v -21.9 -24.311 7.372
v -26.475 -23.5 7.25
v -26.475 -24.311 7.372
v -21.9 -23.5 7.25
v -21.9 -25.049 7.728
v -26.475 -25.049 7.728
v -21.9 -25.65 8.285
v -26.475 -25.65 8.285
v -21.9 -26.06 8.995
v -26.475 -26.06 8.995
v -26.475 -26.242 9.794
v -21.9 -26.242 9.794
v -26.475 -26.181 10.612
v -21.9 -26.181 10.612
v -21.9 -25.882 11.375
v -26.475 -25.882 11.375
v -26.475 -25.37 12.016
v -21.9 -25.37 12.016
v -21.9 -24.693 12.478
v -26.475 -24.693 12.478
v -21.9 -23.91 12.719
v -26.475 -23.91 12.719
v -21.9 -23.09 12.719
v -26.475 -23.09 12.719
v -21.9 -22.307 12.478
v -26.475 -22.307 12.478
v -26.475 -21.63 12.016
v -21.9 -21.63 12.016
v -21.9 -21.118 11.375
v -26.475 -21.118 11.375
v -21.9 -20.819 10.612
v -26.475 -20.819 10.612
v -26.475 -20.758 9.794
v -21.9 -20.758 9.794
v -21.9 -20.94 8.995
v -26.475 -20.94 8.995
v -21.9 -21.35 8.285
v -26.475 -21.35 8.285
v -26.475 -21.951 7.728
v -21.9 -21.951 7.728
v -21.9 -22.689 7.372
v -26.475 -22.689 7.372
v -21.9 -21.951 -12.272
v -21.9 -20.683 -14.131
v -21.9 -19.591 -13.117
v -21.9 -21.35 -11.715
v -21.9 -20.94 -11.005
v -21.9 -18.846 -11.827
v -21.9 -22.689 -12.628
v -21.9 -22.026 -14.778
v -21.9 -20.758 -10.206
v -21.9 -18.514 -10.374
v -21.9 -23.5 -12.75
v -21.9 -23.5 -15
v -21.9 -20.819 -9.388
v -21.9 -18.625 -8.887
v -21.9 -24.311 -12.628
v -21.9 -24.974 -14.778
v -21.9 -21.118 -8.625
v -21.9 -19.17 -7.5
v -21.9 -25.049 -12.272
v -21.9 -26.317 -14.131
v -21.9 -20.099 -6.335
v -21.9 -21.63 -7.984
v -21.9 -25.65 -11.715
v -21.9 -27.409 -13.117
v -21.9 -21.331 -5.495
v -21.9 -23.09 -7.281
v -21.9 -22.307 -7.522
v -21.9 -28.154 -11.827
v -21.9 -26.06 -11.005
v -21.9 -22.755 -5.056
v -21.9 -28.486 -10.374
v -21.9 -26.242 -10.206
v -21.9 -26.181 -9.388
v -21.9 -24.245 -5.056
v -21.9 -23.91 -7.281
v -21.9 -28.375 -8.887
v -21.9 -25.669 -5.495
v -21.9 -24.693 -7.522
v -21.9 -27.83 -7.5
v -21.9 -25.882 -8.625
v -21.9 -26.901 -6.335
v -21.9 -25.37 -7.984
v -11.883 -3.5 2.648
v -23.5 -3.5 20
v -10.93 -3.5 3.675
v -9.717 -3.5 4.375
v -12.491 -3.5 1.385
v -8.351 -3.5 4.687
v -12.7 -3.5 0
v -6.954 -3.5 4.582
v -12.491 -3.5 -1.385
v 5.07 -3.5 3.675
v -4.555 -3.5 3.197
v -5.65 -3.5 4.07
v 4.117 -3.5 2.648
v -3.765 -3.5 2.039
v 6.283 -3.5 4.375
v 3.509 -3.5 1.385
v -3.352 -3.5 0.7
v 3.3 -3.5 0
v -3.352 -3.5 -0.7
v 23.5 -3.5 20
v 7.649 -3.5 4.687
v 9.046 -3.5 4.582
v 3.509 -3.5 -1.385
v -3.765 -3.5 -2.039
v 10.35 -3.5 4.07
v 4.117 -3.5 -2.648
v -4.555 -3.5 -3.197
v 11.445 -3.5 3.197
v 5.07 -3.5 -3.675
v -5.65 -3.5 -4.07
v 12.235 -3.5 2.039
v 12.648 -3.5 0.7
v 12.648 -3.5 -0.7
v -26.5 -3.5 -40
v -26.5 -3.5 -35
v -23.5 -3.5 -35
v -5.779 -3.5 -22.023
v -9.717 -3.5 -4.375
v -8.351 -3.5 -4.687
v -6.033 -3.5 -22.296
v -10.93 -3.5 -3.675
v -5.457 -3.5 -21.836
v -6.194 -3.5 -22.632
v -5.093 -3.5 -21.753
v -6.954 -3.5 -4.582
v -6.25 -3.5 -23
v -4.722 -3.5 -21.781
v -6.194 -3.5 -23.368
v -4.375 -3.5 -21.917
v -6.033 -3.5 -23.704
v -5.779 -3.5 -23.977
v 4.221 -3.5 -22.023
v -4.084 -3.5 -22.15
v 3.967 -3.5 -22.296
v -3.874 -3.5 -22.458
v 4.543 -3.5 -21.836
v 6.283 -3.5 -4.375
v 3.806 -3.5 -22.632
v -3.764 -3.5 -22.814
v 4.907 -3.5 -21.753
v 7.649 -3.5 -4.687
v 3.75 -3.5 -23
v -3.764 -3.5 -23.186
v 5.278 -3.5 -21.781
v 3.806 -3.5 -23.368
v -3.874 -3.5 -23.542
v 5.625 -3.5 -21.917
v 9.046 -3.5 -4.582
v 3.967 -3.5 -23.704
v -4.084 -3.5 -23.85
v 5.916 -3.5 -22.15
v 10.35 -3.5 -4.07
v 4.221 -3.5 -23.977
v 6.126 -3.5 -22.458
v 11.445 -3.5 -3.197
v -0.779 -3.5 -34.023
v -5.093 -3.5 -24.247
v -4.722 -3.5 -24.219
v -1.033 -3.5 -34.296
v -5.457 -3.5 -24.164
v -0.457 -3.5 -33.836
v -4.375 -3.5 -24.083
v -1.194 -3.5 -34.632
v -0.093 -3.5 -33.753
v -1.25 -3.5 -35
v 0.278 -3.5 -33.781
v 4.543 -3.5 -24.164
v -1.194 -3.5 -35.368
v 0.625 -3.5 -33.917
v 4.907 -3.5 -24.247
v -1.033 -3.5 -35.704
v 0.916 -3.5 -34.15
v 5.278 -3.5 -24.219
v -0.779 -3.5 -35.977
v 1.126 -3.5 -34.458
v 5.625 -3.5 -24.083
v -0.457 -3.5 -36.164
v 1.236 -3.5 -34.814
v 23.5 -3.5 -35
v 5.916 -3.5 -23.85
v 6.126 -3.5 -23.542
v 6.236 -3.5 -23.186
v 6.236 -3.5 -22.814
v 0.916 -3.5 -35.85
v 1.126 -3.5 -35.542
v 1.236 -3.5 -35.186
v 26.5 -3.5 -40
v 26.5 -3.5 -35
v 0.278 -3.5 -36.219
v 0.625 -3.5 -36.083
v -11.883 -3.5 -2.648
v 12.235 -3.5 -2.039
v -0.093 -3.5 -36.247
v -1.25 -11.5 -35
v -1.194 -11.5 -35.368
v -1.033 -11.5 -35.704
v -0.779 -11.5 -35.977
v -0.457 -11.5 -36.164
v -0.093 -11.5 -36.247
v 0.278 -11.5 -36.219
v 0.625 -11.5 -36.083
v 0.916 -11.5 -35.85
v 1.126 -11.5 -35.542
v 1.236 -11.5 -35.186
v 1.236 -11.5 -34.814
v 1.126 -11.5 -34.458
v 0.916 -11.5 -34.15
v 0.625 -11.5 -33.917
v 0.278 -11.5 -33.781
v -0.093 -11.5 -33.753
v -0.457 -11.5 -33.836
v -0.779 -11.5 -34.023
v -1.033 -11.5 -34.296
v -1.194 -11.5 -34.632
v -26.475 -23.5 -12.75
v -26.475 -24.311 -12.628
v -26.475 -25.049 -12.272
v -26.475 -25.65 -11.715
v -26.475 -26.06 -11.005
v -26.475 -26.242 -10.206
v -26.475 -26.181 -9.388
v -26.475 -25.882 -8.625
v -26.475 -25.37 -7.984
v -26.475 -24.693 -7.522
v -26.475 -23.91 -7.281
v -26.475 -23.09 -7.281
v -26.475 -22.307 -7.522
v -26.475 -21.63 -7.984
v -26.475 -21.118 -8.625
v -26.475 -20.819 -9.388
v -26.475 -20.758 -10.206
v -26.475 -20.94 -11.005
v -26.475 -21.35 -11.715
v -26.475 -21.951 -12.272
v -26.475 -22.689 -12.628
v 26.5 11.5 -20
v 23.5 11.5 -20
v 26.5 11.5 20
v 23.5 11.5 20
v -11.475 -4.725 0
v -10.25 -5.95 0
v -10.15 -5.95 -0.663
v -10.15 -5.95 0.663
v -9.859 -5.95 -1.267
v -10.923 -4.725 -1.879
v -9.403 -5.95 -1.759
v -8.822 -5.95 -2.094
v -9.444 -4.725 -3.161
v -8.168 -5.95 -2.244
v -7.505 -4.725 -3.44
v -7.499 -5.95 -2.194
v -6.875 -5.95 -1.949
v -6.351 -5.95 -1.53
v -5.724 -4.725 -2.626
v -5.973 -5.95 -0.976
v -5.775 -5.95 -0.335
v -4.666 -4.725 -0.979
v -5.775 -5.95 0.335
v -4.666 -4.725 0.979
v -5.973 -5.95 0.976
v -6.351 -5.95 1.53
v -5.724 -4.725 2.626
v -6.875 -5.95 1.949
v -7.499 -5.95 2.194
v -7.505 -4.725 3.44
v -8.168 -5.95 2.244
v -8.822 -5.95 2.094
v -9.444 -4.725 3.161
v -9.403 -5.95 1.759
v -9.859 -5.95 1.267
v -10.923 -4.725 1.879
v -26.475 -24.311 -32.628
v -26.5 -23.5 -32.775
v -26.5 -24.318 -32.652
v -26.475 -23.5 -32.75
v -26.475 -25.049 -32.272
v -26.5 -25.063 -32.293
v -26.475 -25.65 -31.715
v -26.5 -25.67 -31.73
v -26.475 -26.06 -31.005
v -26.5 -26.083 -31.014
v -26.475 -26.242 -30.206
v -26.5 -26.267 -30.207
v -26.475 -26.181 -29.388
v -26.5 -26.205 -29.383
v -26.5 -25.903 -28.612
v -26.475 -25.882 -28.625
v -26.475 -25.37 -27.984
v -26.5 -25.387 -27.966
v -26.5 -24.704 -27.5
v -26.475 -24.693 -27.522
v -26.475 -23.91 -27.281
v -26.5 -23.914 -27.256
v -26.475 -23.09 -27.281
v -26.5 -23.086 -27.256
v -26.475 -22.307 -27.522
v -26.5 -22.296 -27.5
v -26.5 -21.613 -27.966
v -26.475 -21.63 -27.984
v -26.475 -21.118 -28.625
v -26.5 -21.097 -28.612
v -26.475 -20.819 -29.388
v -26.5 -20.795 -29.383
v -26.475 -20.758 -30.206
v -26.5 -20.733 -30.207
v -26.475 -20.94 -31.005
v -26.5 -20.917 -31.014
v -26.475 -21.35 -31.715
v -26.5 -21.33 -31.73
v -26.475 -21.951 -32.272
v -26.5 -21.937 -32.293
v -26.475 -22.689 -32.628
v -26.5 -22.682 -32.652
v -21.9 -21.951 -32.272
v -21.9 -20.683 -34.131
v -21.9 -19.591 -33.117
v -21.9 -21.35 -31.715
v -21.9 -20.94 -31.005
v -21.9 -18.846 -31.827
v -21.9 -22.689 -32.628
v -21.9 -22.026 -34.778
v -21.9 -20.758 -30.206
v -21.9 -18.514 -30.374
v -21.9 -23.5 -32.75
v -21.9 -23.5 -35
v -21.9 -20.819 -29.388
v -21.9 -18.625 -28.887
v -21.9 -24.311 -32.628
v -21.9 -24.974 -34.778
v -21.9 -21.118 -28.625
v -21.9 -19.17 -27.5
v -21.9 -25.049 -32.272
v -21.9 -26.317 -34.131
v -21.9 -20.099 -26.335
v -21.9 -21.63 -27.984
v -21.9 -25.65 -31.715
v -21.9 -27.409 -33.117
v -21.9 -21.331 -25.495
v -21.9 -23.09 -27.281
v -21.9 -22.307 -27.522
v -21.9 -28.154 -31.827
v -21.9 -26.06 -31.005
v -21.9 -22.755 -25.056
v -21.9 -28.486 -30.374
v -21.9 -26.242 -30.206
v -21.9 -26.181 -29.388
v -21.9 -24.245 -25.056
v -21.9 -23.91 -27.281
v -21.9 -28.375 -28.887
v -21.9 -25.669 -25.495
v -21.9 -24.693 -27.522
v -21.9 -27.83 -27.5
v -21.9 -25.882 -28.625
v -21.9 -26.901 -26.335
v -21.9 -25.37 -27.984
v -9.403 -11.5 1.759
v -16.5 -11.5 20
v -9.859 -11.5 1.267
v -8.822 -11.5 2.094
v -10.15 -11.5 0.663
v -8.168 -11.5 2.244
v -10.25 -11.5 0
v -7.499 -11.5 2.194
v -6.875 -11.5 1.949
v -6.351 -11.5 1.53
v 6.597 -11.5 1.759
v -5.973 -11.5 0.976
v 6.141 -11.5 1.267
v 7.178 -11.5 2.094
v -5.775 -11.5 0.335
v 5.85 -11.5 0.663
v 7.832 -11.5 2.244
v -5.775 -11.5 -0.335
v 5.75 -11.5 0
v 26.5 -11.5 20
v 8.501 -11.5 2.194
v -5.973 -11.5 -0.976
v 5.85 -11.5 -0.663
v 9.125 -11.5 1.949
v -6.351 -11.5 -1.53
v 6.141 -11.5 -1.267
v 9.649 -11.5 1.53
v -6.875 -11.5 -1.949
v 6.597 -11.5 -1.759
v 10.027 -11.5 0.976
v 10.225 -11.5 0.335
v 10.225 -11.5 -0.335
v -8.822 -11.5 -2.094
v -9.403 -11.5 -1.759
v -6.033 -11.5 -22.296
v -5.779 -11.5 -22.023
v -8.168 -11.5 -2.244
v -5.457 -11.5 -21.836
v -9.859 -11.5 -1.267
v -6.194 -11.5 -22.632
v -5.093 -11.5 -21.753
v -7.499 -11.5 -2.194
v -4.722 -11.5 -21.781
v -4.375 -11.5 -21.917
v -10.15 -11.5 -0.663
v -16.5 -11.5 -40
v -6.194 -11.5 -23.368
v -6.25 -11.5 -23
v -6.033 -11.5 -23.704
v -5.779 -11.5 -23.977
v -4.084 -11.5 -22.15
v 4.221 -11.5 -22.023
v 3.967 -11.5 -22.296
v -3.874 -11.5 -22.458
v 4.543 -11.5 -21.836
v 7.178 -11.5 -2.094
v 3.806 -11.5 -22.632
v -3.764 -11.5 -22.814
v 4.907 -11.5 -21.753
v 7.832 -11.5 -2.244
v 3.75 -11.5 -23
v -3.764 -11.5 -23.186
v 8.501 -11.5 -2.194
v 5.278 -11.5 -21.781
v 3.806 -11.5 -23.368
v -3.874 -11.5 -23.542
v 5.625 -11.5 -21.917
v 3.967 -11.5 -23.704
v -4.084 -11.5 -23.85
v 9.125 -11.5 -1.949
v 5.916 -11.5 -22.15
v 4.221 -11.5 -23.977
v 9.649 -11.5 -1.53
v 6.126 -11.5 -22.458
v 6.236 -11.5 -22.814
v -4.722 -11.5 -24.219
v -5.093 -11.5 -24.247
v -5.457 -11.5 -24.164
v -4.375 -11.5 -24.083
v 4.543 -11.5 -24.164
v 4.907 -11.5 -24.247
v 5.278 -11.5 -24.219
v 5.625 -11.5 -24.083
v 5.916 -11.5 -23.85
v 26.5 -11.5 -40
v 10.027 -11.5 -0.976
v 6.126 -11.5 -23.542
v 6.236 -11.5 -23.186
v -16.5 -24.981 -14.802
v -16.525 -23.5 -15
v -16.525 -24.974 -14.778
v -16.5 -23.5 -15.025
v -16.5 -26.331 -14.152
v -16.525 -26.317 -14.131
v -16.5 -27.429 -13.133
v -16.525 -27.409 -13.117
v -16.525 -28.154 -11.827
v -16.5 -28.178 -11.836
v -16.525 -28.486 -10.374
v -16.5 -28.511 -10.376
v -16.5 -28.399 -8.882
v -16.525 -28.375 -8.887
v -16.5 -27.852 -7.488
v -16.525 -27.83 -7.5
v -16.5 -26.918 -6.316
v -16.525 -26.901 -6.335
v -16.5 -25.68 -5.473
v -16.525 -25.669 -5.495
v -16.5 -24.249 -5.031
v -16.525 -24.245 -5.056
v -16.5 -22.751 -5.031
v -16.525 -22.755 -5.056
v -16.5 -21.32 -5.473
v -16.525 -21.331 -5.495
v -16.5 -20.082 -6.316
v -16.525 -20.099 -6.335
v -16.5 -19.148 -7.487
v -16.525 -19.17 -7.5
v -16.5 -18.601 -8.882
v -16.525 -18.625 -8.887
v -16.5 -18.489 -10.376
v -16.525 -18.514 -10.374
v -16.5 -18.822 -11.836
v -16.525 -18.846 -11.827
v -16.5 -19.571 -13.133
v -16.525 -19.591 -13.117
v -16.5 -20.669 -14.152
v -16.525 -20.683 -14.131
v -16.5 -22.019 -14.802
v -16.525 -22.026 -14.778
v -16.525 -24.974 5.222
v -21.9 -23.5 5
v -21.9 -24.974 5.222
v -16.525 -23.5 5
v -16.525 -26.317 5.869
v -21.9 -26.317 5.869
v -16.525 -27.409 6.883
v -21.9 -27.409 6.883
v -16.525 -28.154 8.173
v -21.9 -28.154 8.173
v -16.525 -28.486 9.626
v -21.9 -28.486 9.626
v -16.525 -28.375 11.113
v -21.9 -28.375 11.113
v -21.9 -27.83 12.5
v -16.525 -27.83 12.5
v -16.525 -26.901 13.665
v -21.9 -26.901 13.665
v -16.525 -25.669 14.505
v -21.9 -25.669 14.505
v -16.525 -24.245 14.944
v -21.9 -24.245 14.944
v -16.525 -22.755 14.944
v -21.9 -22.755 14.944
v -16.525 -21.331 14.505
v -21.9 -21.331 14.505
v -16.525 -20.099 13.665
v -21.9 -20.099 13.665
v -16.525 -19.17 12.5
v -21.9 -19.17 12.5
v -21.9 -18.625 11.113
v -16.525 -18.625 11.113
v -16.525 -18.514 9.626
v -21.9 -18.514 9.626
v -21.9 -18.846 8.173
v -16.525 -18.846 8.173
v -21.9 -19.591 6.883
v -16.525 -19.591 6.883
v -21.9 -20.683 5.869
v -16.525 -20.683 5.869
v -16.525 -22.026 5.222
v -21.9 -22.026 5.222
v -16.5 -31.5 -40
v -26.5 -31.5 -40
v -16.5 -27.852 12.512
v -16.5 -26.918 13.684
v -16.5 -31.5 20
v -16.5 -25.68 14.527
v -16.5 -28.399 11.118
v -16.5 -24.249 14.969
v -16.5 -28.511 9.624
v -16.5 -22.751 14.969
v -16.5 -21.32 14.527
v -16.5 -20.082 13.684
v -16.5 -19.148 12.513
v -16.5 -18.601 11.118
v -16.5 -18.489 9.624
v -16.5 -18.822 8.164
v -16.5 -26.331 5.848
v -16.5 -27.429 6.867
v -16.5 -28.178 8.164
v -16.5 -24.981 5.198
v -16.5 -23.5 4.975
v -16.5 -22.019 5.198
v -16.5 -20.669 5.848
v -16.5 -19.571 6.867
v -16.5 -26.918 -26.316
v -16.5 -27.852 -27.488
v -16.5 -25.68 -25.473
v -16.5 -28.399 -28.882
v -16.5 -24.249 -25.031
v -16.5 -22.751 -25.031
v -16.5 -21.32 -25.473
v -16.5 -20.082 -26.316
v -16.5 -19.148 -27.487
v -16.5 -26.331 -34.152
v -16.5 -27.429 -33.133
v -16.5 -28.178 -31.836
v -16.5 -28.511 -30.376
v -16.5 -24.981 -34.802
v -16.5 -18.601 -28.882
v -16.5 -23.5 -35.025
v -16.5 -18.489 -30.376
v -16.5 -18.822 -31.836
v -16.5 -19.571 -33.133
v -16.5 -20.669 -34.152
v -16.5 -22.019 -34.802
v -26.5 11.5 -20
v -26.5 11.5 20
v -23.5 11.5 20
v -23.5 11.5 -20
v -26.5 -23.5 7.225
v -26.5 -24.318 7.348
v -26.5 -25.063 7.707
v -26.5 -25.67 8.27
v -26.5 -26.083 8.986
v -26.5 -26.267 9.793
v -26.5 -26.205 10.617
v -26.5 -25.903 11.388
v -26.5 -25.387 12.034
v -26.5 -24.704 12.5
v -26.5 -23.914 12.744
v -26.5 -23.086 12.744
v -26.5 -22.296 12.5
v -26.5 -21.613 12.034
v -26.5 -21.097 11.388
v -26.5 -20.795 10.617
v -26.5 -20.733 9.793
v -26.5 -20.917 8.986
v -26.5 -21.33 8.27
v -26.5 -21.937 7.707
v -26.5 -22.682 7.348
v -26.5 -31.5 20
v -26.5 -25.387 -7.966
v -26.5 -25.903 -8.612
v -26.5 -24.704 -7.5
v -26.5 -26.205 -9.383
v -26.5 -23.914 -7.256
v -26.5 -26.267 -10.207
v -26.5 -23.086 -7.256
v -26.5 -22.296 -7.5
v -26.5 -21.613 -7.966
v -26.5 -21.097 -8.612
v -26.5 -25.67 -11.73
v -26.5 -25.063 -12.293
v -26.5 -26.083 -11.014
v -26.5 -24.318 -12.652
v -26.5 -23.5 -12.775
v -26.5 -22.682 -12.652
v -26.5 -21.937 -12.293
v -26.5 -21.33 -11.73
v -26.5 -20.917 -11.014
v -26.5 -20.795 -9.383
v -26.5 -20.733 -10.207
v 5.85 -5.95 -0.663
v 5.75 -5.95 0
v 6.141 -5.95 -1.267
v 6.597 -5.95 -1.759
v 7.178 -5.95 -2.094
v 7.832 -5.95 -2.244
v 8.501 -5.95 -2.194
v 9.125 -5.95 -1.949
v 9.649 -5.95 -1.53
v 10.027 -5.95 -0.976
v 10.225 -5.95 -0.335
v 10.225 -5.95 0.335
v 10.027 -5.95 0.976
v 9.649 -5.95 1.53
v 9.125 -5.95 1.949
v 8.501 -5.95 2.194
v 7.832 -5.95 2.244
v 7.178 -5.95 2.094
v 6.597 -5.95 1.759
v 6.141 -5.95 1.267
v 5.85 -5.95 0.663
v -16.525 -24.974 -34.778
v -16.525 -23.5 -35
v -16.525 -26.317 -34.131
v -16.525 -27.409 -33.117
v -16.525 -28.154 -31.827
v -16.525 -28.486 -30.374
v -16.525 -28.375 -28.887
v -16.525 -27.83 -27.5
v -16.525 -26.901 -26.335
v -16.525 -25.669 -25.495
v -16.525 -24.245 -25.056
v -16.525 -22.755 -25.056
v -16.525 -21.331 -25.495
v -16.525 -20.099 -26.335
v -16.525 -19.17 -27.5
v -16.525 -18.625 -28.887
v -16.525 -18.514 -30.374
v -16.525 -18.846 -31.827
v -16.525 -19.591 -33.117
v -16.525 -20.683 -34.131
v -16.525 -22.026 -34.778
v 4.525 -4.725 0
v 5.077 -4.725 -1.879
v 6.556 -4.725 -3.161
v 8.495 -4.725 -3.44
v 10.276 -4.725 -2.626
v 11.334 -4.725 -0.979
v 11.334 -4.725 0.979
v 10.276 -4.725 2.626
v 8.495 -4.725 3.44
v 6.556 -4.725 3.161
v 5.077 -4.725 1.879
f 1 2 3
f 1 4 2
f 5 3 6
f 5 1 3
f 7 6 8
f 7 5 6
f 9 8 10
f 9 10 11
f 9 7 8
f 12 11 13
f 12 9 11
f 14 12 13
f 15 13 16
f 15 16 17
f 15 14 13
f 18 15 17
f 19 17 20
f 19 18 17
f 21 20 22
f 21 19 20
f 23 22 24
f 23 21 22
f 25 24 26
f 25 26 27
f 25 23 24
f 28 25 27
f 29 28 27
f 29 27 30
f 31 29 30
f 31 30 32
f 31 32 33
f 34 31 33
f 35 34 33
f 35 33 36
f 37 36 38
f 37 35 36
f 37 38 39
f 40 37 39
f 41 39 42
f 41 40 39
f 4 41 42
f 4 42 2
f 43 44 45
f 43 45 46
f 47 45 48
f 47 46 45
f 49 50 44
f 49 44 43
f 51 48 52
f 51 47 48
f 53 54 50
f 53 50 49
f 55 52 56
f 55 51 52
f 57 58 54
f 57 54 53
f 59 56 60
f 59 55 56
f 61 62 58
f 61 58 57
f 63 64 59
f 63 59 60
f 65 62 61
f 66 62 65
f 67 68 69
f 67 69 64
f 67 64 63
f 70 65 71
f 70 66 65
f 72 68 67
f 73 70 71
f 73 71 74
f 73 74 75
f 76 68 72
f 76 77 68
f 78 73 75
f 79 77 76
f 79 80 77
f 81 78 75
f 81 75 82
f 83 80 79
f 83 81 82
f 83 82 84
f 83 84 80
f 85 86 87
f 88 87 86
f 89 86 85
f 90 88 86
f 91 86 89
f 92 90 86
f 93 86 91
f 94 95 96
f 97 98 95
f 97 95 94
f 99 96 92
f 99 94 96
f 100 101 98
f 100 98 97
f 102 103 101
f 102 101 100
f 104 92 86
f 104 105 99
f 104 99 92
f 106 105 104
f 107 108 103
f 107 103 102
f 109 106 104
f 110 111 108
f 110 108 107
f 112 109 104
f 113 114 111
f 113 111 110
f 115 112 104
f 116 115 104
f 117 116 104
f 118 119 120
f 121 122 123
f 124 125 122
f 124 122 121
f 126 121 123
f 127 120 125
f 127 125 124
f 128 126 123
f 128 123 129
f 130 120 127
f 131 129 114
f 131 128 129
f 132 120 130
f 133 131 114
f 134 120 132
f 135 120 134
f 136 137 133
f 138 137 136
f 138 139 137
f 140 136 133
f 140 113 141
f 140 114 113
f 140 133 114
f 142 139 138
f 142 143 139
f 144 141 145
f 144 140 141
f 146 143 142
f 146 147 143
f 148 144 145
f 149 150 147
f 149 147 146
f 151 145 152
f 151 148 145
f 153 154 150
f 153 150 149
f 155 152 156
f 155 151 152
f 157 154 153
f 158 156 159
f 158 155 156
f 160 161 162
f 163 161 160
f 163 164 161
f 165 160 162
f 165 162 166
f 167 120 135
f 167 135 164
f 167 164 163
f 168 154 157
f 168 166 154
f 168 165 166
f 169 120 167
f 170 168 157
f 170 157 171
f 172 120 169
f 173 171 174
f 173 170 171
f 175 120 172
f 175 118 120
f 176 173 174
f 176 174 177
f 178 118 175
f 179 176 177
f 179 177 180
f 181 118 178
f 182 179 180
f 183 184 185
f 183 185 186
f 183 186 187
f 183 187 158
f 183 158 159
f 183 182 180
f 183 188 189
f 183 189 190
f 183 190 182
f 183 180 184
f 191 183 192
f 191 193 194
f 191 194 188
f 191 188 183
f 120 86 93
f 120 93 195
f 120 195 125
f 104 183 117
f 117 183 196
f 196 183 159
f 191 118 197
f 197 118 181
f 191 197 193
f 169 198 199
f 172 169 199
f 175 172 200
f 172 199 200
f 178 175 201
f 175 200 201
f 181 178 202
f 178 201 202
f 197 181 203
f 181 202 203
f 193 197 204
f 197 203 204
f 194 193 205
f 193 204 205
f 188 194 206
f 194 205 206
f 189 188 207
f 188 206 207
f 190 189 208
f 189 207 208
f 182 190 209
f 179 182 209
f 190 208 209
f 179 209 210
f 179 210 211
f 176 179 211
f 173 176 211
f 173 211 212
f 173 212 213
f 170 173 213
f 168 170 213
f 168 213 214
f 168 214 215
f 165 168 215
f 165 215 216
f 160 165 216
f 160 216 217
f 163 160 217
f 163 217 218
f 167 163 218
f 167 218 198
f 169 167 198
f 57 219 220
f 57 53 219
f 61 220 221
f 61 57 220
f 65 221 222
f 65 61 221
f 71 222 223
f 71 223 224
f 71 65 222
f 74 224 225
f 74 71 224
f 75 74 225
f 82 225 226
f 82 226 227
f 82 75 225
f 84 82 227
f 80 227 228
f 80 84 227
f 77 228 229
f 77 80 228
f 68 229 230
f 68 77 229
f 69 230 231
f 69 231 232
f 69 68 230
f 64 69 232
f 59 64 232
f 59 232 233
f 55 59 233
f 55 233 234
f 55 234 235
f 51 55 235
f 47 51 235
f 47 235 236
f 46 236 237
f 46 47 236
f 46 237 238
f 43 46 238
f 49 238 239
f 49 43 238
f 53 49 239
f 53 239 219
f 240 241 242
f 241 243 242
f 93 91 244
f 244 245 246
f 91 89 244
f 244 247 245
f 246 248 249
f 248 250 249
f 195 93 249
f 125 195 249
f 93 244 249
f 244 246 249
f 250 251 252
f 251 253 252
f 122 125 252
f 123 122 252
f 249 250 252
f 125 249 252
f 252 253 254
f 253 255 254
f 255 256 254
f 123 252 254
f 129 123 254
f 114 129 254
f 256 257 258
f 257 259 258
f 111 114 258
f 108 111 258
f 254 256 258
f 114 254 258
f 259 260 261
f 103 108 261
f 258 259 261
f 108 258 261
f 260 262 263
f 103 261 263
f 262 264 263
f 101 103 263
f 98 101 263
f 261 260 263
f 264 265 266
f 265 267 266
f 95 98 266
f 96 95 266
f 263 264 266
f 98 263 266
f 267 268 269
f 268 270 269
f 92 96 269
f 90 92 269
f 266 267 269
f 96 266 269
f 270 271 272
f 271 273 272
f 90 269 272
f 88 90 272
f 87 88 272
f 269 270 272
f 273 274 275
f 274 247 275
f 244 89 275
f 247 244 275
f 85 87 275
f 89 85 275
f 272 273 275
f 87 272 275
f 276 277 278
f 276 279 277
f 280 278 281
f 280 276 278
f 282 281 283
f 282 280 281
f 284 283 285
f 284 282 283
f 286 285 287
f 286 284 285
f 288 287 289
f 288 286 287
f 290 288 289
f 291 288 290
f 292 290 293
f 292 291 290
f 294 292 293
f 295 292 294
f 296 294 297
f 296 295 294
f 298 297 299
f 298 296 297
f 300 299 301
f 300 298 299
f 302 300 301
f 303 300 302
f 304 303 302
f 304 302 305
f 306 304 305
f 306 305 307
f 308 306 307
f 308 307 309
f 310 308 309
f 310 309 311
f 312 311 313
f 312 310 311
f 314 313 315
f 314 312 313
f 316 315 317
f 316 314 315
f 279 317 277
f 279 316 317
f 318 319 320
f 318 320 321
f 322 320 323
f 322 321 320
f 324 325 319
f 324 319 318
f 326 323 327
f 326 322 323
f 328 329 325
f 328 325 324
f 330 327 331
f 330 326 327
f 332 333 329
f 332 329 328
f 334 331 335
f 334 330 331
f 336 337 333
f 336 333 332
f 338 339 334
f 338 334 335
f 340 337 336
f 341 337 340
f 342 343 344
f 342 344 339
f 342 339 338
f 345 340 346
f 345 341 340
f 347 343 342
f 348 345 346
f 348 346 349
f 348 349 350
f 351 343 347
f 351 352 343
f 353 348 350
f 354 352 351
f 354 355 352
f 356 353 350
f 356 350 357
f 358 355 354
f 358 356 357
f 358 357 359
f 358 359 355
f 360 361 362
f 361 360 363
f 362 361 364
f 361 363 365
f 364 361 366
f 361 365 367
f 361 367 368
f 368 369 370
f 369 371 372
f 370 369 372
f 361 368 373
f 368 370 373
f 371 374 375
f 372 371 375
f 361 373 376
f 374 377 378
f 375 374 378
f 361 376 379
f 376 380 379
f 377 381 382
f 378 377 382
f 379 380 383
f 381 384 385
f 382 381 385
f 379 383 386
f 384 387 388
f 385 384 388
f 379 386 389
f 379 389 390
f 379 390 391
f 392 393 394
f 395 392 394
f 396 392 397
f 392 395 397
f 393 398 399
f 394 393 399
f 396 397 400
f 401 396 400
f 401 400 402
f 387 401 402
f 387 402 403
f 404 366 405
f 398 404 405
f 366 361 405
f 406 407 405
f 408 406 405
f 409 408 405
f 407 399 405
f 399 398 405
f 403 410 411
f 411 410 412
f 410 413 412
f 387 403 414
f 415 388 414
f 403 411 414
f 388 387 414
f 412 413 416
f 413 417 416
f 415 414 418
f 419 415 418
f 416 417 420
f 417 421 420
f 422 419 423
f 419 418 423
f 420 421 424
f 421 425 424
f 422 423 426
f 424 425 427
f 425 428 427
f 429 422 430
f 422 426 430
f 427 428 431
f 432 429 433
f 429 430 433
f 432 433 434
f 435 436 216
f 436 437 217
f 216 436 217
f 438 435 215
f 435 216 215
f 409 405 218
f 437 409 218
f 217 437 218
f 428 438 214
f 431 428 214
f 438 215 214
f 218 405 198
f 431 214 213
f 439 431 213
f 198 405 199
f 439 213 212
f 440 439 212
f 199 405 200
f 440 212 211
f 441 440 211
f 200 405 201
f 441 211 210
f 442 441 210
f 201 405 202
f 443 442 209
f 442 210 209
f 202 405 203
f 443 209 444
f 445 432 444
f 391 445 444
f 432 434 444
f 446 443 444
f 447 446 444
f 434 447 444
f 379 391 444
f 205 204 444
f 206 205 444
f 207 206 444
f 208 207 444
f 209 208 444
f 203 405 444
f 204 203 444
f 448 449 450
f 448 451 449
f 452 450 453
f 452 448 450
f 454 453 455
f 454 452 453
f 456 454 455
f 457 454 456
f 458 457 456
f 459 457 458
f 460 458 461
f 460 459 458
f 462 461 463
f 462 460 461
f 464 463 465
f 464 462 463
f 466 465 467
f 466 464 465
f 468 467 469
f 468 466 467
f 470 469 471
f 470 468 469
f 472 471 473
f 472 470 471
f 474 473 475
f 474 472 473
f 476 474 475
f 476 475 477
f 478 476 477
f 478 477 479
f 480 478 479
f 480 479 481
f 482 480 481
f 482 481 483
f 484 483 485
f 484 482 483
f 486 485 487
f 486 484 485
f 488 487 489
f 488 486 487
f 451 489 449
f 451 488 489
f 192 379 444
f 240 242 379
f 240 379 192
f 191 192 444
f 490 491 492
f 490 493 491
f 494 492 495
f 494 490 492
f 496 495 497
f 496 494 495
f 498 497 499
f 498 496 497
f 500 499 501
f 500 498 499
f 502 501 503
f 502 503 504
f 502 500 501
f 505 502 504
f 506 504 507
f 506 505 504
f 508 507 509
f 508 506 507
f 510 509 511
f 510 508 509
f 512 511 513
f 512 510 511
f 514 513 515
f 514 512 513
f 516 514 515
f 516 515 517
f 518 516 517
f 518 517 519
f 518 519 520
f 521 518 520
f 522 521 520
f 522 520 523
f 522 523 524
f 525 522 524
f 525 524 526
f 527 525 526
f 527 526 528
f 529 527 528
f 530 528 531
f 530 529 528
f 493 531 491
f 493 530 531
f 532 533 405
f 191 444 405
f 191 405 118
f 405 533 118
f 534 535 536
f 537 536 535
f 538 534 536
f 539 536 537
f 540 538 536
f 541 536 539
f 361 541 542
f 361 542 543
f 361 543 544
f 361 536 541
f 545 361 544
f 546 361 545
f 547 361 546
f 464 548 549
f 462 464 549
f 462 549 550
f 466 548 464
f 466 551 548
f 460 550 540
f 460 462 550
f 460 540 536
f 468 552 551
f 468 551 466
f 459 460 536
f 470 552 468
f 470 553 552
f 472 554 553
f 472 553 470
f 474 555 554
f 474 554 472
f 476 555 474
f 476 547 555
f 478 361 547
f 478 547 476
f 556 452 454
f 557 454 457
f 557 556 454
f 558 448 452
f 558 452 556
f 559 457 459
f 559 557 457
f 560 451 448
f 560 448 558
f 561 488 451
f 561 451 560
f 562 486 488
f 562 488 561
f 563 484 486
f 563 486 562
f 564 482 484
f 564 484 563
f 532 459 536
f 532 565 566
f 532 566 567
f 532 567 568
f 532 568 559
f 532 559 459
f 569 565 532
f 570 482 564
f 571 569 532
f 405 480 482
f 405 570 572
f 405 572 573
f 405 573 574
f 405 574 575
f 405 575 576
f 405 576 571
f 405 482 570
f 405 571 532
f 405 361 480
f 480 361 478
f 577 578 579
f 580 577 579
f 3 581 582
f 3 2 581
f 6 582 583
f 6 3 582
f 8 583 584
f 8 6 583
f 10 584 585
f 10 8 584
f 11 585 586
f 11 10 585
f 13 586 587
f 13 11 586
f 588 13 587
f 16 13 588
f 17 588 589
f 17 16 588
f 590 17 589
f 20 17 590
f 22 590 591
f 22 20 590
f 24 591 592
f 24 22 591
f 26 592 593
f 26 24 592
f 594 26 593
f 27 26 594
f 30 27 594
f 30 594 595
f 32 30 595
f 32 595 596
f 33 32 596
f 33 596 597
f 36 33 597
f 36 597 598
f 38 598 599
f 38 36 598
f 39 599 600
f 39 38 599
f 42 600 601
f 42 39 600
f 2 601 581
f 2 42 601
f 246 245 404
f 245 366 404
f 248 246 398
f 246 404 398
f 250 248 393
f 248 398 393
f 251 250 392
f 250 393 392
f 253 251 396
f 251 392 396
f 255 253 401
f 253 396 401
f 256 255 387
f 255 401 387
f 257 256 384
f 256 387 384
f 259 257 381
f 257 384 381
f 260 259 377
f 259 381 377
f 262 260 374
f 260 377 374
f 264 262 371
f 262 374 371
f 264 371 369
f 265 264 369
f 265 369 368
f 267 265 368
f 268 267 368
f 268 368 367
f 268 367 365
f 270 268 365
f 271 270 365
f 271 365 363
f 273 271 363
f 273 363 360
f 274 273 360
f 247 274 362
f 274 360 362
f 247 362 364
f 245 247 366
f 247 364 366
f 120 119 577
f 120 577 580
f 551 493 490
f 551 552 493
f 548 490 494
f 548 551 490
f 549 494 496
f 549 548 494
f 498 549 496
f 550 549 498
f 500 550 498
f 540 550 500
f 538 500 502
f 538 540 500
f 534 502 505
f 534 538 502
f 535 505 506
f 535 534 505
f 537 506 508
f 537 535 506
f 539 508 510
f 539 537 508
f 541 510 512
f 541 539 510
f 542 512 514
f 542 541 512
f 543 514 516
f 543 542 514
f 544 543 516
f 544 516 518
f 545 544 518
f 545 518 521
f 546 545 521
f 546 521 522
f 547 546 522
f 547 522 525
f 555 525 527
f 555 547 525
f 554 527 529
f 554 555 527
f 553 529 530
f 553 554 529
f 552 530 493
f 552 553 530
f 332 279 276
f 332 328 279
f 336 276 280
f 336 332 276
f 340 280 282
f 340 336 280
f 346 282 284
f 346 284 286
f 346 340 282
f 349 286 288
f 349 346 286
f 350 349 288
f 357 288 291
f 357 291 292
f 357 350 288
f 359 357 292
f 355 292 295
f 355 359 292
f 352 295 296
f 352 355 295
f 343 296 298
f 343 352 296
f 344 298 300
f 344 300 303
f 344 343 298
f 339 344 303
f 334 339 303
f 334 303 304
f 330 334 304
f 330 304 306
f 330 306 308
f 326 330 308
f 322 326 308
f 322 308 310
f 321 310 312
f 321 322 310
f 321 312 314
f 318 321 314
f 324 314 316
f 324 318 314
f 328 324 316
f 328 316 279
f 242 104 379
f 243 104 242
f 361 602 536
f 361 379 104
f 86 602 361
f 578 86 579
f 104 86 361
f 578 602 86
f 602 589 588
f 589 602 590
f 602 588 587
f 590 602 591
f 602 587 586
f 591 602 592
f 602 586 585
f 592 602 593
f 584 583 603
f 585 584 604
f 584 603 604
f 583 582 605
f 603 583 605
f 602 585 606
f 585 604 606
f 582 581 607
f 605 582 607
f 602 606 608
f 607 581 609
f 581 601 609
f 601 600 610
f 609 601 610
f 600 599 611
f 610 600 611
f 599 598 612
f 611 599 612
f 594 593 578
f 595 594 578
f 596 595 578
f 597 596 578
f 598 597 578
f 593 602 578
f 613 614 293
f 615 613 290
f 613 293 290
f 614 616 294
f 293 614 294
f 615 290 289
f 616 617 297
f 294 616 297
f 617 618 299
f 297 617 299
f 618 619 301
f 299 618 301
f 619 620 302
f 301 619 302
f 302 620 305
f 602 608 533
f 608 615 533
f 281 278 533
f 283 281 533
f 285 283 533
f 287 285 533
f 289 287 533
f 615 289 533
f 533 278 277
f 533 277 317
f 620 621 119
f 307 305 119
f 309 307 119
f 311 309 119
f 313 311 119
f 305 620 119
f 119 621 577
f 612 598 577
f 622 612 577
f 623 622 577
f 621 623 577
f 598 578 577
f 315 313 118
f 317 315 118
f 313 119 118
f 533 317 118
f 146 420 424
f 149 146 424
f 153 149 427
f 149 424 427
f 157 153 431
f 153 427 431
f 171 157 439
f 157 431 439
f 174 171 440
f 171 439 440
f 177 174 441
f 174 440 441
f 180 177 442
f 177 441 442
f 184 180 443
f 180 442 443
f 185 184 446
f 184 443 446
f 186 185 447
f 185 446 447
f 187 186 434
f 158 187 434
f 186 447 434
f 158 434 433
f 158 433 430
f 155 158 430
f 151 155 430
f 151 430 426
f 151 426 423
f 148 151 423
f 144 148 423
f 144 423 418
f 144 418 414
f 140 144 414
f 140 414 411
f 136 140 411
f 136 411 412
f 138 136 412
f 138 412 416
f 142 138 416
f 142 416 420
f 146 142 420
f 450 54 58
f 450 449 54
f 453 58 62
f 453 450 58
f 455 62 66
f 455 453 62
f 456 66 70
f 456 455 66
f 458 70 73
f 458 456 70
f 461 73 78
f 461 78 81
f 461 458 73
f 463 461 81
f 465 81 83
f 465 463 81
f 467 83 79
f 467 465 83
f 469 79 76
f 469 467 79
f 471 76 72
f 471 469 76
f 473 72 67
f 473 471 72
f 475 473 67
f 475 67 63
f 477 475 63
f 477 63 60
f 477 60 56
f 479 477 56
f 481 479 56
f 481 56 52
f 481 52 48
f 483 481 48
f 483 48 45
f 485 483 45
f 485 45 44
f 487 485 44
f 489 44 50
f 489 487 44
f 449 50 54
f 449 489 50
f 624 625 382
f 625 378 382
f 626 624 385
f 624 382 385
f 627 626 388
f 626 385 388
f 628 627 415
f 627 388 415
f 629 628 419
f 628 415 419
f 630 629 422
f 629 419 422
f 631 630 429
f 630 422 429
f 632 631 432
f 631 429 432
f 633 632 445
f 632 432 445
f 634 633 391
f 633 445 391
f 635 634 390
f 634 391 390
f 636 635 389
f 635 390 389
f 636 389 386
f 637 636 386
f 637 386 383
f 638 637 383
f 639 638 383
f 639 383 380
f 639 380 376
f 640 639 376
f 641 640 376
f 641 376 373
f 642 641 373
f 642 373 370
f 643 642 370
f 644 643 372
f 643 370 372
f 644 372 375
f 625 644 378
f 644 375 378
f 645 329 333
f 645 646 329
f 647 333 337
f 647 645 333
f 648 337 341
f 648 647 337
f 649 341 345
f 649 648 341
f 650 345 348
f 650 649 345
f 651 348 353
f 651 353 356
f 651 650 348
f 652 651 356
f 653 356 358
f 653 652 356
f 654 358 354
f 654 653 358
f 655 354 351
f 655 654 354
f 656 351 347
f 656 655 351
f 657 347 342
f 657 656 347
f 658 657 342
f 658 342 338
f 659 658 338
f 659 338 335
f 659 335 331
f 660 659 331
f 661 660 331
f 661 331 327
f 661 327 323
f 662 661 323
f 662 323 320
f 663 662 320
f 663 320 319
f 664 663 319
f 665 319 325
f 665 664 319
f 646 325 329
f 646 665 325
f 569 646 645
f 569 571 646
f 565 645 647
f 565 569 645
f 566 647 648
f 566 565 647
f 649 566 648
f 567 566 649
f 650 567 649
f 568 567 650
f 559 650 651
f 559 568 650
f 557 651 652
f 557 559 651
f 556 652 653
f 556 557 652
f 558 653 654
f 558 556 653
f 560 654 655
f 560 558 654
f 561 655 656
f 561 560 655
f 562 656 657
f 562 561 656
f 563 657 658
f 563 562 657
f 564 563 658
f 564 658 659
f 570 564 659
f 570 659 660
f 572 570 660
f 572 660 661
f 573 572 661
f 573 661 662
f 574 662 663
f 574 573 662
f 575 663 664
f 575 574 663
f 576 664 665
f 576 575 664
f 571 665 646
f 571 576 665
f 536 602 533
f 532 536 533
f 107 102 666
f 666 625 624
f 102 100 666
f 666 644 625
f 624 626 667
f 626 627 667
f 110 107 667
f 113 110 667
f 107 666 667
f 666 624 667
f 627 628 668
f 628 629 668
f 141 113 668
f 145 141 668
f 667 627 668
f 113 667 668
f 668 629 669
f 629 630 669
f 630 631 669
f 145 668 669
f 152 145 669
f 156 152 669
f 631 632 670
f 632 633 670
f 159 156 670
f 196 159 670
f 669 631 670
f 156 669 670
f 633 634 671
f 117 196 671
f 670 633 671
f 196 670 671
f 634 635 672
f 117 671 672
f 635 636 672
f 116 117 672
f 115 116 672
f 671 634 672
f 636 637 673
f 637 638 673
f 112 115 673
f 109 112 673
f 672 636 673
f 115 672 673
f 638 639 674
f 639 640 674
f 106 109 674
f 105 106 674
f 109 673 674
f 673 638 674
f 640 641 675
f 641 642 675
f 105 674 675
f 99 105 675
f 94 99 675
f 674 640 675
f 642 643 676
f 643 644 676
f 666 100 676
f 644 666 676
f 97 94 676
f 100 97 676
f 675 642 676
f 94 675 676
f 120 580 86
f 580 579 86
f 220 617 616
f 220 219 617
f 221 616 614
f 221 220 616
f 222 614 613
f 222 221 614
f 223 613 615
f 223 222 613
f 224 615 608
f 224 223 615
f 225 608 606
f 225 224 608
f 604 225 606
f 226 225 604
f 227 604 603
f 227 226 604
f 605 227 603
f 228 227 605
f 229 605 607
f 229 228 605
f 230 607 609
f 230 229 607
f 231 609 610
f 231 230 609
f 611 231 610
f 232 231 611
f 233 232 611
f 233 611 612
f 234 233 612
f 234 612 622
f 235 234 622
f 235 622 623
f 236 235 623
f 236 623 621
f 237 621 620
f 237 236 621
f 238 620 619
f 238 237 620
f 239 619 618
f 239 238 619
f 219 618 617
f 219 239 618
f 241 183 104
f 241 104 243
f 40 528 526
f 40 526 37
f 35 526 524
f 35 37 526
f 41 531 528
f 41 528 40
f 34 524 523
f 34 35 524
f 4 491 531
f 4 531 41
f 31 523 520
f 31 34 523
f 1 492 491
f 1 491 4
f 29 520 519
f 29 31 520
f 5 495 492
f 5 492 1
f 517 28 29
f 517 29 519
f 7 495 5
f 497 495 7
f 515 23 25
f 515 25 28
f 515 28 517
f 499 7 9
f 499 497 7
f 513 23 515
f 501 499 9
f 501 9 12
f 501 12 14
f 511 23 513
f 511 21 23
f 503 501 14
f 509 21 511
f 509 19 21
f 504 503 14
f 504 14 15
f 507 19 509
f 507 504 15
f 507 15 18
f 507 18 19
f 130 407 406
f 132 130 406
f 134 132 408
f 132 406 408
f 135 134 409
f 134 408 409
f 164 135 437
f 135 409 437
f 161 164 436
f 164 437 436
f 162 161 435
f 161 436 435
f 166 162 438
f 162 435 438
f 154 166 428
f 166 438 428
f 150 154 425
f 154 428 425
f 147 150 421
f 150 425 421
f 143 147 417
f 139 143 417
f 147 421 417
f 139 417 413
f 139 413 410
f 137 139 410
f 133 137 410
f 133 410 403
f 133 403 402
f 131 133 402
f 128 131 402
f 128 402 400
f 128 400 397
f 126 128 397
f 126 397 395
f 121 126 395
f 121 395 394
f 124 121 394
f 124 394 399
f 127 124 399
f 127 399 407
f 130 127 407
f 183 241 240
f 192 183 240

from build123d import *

# Parameters (mm, degrees)
BOSS_EXTRUDE1_DEPTH                                 = 20
SKETCH2_W                                           = 53
SKETCH2_H                                           = 20
BOSS_EXTRUDE2_DEPTH                                 = 8
SKETCH11_W                                          = 60
SKETCH11_H                                          = 20
BOSS_EXTRUDE3_DEPTH                                 = 10
M3_TAPPED_HOLE1_D                                   = 2.5
CSK_FOR_M4_COUNTERSUNK_FLAT_HEAD_SCREW1_D           = 4.5
CSK_FOR_M4_COUNTERSUNK_FLAT_HEAD_SCREW1_CSINK_D     = 9.4
CSK_FOR_M4_COUNTERSUNK_FLAT_HEAD_SCREW1_CSINK_ANGLE = 90
CHAMFER1_SIZE                                       = 15
CBORE_FOR_M5_HEX_SOCKET_HEAD_CAP_SCR_2_COUNT        = 2
CBORE_FOR_M5_HEX_SOCKET_HEAD_CAP_SCR_2_PITCH        = 20
CBORE_FOR_M5_HEX_SOCKET_HEAD_CAP_SCR_3_COUNT        = 2
CBORE_FOR_M5_HEX_SOCKET_HEAD_CAP_SCR_3_PITCH        = 40


with BuildPart() as part:
    # Sketch1 → Boss-Extrude1 (new, symmetric)
    with BuildSketch(Plane.XY):
        Polygon((-23.5, 11.5), (-23.5, -3.5), (23.5, -3.5), (23.5, 11.5), (26.5, 11.5), (26.5, -11.5), (-26.5, -11.5), (-26.5, 11.5), align=None)
    extrude(amount=BOSS_EXTRUDE1_DEPTH, both=True)

    # Sketch2 → Boss-Extrude2 (add)
    with BuildSketch(Plane(origin=(0, -3.5, 0), x_dir=(1, 0, 0), z_dir=(0, 1, 0))):
        with Locations((0, 30)):
            Rectangle(SKETCH2_W, SKETCH2_H)
    extrude(amount=-BOSS_EXTRUDE2_DEPTH)

    # Sketch11 → Boss-Extrude3 (add)
    with BuildSketch(Plane(origin=(-26.5, 0, 0), x_dir=(0, 0, -1), z_dir=(1, 0, 0))):
        with Locations((10, -21.5)):
            Rectangle(SKETCH11_W, SKETCH11_H)
    extrude(amount=BOSS_EXTRUDE3_DEPTH)

    # M3 Tapped Hole1 (through all)
    with Locations(Plane(origin=(0, -3.5, 0), x_dir=(1, 0, 0), z_dir=(0, 1, 0))):
        with Locations((0, 35), (-5, 23), (5, 23)):
            Hole(M3_TAPPED_HOLE1_D / 2)

    # CSK for M4 Countersunk Flat Head Screw1 (through all)
    with Locations(Plane(origin=(0, -3.5, 0), x_dir=(1, 0, 0), z_dir=(0, 1, 0))):
        with Locations((-8, 0), (8, 0)):
            CounterSinkHole(CSK_FOR_M4_COUNTERSUNK_FLAT_HEAD_SCREW1_D / 2, CSK_FOR_M4_COUNTERSUNK_FLAT_HEAD_SCREW1_CSINK_D / 2, counter_sink_angle=CSK_FOR_M4_COUNTERSUNK_FLAT_HEAD_SCREW1_CSINK_ANGLE)

    # Chamfer1
    chamfer1_edges = [part.edges().sort_by_distance(p)[0] for p in [
        (-25, -3.5, -20),
        (25, -3.5, -20),
    ]]
    chamfer(chamfer1_edges, length=CHAMFER1_SIZE - 0.0001)  # a hair under: the kernel refuses the full size

    # Sketch14 → CBORE for M5 Hex Socket Head Cap Screw1 (revolve, cut)
    with BuildSketch(Plane(origin=(-16.5, -23.5, -30), x_dir=(0, 0, -1), z_dir=(0, 1, 0))):
        Polygon((0, 0), (0, 10), (2.775, 10), (2.75, 9.975), (2.75, 5.4), (5, 5.4), (5, 0.025), (5.025, 0), align=None)
    cbore_for_m5_hex_socket_head_cap_screw1 = revolve(axis=Axis((-10.15, -23.5, -30), (-1, 0, 0)), mode=Mode.SUBTRACT)

    # CBORE for M5 Hex Socket Head Cap Scr 2: CBORE for M5 Hex Socket Head Cap Screw1 ×2
    with Locations(*[(0, 0, i * CBORE_FOR_M5_HEX_SOCKET_HEAD_CAP_SCR_2_PITCH) for i in range(1, CBORE_FOR_M5_HEX_SOCKET_HEAD_CAP_SCR_2_COUNT)]):
        add(cbore_for_m5_hex_socket_head_cap_screw1, mode=Mode.SUBTRACT)

    # CBORE for M5 Hex Socket Head Cap Scr 3: CBORE for M5 Hex Socket Head Cap Screw1 ×2
    with Locations(*[(0, 0, i * CBORE_FOR_M5_HEX_SOCKET_HEAD_CAP_SCR_3_PITCH) for i in range(1, CBORE_FOR_M5_HEX_SOCKET_HEAD_CAP_SCR_3_COUNT)]):
        add(cbore_for_m5_hex_socket_head_cap_screw1, mode=Mode.SUBTRACT)


solid = part.part
